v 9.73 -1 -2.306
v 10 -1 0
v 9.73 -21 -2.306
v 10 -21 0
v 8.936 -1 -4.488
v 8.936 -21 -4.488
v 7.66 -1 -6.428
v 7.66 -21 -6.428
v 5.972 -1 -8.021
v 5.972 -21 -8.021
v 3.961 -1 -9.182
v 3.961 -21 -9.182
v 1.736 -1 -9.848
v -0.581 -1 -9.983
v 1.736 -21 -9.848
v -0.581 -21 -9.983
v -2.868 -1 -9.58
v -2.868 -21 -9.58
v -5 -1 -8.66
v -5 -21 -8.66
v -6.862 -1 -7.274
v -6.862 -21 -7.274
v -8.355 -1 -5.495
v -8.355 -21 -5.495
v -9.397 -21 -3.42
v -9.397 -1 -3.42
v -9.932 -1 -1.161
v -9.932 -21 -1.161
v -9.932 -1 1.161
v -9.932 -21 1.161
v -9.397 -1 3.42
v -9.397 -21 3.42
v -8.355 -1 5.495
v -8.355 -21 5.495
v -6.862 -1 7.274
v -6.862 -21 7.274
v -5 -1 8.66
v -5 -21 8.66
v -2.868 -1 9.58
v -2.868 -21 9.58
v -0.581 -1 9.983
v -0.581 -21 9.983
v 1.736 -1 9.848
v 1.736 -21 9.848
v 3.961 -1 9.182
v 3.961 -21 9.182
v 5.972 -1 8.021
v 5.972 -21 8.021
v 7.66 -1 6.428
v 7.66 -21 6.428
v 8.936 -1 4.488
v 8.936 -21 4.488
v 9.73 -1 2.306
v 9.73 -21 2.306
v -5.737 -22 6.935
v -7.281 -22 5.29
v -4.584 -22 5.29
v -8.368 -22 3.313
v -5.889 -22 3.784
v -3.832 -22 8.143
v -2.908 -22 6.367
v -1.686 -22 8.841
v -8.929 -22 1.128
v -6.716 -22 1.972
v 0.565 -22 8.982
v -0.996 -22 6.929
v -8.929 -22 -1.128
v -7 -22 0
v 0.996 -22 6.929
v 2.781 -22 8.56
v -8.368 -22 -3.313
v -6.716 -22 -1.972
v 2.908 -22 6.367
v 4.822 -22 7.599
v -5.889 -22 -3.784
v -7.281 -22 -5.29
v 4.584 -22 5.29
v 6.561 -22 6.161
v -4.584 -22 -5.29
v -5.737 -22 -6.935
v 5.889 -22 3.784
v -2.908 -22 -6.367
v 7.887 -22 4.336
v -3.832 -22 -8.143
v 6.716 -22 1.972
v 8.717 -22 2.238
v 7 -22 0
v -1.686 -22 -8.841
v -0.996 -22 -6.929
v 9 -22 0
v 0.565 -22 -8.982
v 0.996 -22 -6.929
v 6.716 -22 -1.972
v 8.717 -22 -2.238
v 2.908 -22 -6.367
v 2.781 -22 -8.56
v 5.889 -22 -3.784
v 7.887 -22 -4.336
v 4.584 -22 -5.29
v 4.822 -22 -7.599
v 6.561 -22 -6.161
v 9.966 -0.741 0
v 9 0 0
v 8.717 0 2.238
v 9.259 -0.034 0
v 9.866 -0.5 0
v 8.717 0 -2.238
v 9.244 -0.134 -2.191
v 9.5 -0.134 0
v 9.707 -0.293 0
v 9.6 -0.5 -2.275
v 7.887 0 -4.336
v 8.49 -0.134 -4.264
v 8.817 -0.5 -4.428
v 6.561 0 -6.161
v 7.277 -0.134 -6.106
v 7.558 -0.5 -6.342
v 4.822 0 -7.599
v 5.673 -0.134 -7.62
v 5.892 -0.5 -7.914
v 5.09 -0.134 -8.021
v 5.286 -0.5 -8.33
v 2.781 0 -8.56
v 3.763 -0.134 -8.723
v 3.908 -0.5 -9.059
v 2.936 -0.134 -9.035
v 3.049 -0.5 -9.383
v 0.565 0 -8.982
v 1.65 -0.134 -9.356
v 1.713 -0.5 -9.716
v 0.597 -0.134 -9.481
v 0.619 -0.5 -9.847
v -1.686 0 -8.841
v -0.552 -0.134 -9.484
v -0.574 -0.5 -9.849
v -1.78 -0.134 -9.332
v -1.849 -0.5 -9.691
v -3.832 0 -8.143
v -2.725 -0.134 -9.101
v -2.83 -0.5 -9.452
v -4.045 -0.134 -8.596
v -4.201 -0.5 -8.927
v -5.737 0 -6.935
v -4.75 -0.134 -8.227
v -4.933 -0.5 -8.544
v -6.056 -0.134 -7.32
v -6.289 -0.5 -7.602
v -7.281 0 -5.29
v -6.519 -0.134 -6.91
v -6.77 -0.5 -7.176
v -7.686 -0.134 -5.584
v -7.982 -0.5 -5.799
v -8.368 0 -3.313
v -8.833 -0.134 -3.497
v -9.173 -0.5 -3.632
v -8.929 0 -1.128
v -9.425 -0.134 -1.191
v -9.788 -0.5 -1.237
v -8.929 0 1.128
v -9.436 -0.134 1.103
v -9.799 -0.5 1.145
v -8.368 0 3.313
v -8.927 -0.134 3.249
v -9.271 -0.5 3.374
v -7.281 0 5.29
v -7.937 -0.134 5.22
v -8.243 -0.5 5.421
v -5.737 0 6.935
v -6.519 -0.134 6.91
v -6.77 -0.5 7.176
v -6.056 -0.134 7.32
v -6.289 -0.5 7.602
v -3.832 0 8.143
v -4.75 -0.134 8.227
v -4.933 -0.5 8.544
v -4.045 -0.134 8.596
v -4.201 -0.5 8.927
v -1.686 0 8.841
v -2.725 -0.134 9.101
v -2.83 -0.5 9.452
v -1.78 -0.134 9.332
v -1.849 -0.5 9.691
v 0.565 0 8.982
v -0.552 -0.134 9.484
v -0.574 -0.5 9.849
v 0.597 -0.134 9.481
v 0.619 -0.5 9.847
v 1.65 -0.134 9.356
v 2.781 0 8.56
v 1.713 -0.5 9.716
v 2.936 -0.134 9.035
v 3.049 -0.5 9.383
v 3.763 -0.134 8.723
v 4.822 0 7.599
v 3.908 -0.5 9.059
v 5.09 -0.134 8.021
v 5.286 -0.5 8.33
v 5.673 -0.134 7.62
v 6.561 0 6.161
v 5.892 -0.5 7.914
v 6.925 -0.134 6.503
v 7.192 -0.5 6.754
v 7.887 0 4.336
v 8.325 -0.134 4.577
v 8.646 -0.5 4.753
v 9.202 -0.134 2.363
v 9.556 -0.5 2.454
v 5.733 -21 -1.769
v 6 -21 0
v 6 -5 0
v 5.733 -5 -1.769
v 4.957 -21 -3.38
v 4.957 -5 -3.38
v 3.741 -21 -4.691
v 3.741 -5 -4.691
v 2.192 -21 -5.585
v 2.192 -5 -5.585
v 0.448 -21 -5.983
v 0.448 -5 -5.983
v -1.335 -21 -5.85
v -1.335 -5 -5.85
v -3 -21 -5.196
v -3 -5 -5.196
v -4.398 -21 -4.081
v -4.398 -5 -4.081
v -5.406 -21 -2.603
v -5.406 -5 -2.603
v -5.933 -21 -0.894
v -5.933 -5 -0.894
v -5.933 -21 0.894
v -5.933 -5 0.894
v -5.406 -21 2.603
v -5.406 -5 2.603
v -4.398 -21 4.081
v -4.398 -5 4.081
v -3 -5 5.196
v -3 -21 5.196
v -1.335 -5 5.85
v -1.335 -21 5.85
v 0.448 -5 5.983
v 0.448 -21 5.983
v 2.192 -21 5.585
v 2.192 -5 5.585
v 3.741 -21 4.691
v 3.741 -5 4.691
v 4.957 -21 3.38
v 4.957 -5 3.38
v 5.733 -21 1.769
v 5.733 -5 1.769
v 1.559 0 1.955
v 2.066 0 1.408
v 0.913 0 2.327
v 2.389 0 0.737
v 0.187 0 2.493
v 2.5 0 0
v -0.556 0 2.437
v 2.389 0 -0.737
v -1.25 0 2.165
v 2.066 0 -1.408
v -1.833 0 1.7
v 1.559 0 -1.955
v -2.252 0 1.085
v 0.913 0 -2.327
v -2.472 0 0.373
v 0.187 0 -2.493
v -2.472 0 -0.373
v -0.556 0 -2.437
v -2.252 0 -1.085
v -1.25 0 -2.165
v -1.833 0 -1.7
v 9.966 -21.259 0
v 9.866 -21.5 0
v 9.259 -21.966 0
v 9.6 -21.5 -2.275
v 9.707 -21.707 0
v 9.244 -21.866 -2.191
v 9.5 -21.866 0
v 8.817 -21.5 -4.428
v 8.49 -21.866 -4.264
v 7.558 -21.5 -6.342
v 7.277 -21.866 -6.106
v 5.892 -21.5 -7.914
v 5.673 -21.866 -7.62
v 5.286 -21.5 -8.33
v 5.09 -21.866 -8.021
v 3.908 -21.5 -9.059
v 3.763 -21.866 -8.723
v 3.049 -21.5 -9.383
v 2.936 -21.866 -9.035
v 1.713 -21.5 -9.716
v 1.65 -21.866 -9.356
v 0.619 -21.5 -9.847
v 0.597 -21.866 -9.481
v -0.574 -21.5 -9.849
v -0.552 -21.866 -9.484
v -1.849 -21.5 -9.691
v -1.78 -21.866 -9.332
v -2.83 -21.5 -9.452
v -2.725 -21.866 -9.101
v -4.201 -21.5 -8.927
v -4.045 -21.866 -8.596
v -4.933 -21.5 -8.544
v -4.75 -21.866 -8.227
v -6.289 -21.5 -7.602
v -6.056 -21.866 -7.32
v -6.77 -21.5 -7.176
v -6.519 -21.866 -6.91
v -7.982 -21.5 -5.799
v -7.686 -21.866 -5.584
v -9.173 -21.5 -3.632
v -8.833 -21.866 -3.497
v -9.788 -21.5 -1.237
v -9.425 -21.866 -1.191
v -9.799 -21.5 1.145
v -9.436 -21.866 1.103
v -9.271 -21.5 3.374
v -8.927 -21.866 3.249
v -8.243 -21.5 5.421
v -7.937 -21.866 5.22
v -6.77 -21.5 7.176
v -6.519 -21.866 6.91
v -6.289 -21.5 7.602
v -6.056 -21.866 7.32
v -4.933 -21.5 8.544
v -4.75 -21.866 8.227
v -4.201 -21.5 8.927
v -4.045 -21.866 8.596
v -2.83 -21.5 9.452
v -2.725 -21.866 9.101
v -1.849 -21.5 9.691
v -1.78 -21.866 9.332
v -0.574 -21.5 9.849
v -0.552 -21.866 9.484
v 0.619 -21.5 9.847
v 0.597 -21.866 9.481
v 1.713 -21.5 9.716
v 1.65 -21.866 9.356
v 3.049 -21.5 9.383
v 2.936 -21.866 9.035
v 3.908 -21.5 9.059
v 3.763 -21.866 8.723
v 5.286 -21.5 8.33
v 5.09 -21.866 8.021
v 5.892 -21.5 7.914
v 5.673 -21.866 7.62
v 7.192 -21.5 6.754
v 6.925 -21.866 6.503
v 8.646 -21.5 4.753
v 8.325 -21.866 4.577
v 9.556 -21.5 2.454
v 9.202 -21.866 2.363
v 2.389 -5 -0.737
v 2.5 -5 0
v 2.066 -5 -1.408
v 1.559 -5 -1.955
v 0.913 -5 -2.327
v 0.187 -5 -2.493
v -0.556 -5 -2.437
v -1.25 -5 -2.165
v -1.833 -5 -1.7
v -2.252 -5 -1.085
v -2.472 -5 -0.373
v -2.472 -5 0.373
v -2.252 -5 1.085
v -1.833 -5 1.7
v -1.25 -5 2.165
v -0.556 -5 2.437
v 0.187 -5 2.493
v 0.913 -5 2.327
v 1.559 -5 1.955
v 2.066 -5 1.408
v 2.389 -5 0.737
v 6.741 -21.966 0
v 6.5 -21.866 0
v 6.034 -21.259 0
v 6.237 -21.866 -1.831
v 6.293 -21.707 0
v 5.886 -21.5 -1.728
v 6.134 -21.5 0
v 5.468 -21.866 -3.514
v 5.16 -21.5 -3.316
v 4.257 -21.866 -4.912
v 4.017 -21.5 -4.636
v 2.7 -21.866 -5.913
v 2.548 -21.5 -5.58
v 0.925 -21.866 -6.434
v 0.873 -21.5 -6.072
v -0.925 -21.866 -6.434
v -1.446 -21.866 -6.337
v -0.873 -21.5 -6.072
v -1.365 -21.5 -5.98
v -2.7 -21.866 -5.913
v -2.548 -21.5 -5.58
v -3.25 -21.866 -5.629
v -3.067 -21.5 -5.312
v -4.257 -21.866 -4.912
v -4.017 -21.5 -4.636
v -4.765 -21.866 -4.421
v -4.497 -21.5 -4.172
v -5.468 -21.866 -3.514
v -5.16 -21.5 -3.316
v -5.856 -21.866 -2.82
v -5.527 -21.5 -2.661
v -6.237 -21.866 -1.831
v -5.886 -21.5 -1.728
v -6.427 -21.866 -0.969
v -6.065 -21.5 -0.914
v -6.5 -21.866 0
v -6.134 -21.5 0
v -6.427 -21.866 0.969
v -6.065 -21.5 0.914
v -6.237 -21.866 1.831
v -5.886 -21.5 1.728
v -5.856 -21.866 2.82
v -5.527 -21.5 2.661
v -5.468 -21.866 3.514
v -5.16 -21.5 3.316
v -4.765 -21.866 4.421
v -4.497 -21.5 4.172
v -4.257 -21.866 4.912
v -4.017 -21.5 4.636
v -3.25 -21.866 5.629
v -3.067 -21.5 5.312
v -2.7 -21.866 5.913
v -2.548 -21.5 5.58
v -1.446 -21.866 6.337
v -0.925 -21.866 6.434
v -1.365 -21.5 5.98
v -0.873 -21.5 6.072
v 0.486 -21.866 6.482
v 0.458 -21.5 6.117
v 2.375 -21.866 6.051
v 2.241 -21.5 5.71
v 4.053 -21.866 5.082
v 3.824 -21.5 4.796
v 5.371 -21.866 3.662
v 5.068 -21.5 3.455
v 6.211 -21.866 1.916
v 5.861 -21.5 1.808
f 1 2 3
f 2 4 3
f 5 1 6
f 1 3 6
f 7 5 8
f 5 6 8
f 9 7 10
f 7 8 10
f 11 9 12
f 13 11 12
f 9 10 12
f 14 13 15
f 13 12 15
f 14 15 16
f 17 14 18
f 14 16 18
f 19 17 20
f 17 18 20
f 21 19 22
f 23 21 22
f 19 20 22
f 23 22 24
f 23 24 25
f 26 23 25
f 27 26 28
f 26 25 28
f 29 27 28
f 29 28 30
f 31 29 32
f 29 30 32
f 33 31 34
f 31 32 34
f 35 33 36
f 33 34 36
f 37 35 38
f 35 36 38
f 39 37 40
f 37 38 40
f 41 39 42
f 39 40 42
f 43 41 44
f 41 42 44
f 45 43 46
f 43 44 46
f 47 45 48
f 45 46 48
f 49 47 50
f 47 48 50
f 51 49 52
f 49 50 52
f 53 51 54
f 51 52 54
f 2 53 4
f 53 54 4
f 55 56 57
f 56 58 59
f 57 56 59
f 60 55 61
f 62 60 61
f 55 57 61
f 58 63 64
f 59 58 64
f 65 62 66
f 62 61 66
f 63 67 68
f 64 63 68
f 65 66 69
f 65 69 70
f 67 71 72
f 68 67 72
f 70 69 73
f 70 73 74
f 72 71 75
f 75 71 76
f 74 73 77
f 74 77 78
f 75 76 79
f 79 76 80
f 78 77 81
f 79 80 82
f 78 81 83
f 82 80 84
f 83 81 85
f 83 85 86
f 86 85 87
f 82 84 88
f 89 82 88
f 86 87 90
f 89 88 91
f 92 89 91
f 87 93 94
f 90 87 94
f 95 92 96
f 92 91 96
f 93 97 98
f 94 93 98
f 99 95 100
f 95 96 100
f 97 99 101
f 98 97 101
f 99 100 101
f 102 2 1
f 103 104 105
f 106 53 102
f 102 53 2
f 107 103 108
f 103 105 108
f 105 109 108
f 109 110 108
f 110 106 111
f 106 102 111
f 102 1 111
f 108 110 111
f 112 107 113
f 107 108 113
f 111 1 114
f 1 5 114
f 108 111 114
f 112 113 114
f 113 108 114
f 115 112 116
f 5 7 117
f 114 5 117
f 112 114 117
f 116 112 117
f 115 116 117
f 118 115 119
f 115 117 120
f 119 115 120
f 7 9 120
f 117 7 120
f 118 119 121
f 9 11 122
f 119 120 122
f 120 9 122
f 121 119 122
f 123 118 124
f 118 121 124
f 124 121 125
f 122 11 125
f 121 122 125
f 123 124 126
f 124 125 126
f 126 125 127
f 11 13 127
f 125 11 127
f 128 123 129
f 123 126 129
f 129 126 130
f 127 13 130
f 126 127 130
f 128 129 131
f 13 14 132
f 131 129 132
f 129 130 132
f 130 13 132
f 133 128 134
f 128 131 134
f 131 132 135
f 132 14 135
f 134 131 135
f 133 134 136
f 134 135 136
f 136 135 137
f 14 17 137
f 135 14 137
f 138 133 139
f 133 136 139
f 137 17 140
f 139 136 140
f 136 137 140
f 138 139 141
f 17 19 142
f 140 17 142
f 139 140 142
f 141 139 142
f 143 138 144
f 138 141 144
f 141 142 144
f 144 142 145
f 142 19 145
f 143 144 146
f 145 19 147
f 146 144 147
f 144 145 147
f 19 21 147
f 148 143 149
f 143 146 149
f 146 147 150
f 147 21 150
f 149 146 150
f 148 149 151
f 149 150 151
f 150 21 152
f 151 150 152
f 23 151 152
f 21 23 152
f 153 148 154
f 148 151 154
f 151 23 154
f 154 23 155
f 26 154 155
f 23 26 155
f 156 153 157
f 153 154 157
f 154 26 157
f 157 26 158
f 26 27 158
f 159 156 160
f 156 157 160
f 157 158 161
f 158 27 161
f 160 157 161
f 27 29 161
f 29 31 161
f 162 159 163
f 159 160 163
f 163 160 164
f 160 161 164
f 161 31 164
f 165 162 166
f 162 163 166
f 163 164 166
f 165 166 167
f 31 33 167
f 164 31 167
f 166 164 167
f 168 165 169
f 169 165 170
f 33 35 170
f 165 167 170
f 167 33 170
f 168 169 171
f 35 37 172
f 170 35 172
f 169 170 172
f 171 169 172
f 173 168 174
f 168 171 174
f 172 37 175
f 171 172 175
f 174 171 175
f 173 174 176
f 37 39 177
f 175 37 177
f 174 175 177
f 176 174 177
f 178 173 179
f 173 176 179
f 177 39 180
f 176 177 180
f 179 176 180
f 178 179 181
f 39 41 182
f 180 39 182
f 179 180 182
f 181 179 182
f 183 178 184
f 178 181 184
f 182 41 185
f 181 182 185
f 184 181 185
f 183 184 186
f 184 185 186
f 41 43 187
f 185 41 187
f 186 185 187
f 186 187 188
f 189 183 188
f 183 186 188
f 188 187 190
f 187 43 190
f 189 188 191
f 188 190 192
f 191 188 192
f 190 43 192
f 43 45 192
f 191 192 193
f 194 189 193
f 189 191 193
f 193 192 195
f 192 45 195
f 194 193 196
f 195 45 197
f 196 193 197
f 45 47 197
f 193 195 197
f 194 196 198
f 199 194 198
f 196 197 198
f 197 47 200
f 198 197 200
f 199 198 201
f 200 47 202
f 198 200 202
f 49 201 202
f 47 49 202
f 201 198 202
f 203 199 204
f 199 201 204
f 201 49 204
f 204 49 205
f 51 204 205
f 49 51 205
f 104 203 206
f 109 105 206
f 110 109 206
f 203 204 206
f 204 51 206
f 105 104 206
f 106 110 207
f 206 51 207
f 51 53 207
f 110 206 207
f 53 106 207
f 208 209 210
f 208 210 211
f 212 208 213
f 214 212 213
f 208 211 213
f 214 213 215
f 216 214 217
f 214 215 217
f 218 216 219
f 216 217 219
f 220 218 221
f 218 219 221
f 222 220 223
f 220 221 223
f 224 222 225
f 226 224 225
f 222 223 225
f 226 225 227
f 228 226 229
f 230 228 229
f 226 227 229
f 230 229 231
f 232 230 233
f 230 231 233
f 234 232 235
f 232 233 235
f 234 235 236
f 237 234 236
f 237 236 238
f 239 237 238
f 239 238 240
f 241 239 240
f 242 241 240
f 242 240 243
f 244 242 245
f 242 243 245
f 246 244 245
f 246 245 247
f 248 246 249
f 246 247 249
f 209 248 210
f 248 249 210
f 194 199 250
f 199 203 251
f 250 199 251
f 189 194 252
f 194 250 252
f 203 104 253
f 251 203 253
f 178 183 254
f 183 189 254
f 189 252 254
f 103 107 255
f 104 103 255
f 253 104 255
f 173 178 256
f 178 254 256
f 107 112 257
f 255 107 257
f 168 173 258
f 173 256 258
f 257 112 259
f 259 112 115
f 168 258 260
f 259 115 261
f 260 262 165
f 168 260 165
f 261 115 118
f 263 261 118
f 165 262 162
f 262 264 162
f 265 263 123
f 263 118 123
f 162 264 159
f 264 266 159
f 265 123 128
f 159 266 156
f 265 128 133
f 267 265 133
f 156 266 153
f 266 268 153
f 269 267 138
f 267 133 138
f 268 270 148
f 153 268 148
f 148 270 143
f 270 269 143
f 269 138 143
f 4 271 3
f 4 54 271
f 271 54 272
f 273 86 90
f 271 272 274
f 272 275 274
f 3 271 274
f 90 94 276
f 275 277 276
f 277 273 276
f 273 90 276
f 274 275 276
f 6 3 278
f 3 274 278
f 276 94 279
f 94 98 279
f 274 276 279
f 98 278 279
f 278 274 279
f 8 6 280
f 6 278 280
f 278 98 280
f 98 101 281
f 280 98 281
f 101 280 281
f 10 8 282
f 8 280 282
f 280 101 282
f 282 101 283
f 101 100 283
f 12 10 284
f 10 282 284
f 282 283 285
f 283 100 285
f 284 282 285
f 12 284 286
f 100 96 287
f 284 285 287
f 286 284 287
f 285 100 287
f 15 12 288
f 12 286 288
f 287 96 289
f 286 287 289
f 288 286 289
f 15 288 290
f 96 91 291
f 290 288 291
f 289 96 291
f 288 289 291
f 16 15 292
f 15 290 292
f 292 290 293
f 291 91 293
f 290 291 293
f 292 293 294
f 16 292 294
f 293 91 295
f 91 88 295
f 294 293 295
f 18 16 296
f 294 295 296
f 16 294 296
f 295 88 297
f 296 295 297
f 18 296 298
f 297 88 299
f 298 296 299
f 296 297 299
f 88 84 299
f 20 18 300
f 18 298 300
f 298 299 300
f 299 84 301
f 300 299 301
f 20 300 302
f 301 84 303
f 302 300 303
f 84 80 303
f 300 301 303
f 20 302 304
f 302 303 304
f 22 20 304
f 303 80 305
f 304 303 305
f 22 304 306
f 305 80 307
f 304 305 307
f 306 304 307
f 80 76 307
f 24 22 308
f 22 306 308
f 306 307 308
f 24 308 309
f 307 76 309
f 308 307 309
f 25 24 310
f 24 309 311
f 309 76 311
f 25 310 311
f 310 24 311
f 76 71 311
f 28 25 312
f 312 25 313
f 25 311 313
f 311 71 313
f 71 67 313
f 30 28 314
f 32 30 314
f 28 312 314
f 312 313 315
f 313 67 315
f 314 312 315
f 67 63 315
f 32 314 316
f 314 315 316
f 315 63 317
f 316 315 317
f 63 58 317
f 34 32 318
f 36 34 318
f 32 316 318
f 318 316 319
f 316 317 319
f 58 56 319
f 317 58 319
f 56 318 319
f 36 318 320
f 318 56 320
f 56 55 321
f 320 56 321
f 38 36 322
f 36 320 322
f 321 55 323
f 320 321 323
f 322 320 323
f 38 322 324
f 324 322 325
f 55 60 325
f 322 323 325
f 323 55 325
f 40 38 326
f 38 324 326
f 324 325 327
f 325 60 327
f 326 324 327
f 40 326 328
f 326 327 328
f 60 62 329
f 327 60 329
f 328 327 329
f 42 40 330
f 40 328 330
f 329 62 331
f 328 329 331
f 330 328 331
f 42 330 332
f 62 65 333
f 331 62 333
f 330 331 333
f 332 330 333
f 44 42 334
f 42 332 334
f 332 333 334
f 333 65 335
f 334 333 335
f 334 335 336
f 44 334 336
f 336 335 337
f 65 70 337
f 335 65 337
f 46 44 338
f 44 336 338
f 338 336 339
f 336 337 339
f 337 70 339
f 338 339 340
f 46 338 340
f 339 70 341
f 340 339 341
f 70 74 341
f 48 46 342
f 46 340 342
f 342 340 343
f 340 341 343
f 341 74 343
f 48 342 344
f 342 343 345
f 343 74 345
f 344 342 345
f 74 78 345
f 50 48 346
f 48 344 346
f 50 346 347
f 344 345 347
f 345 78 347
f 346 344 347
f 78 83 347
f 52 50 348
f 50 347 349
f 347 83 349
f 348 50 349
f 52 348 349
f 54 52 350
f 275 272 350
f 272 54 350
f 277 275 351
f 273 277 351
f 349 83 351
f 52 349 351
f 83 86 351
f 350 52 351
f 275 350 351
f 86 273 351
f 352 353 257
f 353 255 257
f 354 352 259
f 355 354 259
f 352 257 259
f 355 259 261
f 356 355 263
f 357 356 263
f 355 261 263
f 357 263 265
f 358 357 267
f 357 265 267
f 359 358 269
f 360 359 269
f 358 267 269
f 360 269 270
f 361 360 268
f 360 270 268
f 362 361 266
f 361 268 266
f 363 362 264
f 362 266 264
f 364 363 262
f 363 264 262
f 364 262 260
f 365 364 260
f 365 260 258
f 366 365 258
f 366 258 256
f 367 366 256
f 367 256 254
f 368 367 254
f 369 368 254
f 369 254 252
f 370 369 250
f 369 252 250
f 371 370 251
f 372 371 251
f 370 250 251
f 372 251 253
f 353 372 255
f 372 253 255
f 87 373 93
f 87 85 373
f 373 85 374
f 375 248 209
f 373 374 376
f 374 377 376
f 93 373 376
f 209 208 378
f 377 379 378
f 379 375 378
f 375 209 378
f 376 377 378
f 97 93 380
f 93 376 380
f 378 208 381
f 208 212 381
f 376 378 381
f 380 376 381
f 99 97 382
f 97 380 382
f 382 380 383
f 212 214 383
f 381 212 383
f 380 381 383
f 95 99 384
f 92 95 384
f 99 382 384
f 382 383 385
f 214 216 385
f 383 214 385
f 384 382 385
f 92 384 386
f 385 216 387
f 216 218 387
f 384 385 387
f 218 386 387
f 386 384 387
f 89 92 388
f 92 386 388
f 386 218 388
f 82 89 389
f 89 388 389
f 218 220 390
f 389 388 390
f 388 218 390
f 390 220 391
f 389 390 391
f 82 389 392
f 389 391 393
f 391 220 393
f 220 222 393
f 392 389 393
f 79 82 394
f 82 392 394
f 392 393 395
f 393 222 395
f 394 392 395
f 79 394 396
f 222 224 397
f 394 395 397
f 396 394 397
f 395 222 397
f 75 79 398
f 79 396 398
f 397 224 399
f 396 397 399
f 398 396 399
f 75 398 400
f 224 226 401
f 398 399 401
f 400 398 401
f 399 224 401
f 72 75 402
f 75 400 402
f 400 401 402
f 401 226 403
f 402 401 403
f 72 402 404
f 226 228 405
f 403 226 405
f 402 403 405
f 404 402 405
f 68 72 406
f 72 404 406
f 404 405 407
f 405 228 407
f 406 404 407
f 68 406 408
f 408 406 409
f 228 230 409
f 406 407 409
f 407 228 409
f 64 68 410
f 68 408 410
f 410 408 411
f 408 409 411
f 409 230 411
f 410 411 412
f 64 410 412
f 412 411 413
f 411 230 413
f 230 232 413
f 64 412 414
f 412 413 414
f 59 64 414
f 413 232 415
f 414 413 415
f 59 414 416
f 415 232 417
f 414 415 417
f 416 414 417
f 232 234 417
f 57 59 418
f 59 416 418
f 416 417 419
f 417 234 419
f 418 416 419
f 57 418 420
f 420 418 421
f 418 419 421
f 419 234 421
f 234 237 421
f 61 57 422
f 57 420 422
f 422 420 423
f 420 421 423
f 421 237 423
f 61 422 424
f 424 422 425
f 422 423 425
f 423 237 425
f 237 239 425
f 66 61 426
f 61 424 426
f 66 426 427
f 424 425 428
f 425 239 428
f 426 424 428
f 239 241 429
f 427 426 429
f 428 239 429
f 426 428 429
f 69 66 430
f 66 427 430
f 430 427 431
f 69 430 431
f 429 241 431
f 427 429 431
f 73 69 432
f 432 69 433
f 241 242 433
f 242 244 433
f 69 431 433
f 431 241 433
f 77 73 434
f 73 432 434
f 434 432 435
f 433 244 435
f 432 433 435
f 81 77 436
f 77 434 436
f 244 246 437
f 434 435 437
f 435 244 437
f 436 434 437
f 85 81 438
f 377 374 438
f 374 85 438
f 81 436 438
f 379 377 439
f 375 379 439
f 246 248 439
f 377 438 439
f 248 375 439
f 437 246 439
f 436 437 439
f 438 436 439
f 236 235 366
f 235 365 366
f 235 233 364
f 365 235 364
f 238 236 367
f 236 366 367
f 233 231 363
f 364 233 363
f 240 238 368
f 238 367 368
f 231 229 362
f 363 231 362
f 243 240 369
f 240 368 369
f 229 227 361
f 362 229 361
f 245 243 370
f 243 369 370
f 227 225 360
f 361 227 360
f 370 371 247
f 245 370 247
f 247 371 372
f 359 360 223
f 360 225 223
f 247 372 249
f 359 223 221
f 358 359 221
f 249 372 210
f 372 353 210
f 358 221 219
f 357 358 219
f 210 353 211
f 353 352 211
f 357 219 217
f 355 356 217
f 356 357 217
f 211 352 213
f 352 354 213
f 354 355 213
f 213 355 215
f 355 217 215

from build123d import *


with BuildPart() as part:
    # Sketch1 → Revolve1 (revolve)
    with BuildSketch(Plane(origin=(0, 0, 0), x_dir=(-1, 0, 0), z_dir=(0, 0, -1))):
        with BuildLine():
            Line((-6, -21), (-6, -5))
            Line((-6, -5), (-2.5, -5))
            Line((-2.5, -5), (-2.5, 0))
            Line((-2.5, 0), (-9, 0))
            ThreePointArc((-9, 0), (-9.707106781, -0.292893219), (-10, -1))
            Line((-10, -1), (-10, -21))
            ThreePointArc((-10, -21), (-9.707106781, -21.707106781), (-9, -22))
            Line((-9, -22), (-7, -22))
            ThreePointArc((-7, -22), (-6.292893219, -21.707106781), (-6, -21))
        make_face()
    revolve(axis=Axis((0, -22, 0), (0, 1, 0)))


solid = part.part
